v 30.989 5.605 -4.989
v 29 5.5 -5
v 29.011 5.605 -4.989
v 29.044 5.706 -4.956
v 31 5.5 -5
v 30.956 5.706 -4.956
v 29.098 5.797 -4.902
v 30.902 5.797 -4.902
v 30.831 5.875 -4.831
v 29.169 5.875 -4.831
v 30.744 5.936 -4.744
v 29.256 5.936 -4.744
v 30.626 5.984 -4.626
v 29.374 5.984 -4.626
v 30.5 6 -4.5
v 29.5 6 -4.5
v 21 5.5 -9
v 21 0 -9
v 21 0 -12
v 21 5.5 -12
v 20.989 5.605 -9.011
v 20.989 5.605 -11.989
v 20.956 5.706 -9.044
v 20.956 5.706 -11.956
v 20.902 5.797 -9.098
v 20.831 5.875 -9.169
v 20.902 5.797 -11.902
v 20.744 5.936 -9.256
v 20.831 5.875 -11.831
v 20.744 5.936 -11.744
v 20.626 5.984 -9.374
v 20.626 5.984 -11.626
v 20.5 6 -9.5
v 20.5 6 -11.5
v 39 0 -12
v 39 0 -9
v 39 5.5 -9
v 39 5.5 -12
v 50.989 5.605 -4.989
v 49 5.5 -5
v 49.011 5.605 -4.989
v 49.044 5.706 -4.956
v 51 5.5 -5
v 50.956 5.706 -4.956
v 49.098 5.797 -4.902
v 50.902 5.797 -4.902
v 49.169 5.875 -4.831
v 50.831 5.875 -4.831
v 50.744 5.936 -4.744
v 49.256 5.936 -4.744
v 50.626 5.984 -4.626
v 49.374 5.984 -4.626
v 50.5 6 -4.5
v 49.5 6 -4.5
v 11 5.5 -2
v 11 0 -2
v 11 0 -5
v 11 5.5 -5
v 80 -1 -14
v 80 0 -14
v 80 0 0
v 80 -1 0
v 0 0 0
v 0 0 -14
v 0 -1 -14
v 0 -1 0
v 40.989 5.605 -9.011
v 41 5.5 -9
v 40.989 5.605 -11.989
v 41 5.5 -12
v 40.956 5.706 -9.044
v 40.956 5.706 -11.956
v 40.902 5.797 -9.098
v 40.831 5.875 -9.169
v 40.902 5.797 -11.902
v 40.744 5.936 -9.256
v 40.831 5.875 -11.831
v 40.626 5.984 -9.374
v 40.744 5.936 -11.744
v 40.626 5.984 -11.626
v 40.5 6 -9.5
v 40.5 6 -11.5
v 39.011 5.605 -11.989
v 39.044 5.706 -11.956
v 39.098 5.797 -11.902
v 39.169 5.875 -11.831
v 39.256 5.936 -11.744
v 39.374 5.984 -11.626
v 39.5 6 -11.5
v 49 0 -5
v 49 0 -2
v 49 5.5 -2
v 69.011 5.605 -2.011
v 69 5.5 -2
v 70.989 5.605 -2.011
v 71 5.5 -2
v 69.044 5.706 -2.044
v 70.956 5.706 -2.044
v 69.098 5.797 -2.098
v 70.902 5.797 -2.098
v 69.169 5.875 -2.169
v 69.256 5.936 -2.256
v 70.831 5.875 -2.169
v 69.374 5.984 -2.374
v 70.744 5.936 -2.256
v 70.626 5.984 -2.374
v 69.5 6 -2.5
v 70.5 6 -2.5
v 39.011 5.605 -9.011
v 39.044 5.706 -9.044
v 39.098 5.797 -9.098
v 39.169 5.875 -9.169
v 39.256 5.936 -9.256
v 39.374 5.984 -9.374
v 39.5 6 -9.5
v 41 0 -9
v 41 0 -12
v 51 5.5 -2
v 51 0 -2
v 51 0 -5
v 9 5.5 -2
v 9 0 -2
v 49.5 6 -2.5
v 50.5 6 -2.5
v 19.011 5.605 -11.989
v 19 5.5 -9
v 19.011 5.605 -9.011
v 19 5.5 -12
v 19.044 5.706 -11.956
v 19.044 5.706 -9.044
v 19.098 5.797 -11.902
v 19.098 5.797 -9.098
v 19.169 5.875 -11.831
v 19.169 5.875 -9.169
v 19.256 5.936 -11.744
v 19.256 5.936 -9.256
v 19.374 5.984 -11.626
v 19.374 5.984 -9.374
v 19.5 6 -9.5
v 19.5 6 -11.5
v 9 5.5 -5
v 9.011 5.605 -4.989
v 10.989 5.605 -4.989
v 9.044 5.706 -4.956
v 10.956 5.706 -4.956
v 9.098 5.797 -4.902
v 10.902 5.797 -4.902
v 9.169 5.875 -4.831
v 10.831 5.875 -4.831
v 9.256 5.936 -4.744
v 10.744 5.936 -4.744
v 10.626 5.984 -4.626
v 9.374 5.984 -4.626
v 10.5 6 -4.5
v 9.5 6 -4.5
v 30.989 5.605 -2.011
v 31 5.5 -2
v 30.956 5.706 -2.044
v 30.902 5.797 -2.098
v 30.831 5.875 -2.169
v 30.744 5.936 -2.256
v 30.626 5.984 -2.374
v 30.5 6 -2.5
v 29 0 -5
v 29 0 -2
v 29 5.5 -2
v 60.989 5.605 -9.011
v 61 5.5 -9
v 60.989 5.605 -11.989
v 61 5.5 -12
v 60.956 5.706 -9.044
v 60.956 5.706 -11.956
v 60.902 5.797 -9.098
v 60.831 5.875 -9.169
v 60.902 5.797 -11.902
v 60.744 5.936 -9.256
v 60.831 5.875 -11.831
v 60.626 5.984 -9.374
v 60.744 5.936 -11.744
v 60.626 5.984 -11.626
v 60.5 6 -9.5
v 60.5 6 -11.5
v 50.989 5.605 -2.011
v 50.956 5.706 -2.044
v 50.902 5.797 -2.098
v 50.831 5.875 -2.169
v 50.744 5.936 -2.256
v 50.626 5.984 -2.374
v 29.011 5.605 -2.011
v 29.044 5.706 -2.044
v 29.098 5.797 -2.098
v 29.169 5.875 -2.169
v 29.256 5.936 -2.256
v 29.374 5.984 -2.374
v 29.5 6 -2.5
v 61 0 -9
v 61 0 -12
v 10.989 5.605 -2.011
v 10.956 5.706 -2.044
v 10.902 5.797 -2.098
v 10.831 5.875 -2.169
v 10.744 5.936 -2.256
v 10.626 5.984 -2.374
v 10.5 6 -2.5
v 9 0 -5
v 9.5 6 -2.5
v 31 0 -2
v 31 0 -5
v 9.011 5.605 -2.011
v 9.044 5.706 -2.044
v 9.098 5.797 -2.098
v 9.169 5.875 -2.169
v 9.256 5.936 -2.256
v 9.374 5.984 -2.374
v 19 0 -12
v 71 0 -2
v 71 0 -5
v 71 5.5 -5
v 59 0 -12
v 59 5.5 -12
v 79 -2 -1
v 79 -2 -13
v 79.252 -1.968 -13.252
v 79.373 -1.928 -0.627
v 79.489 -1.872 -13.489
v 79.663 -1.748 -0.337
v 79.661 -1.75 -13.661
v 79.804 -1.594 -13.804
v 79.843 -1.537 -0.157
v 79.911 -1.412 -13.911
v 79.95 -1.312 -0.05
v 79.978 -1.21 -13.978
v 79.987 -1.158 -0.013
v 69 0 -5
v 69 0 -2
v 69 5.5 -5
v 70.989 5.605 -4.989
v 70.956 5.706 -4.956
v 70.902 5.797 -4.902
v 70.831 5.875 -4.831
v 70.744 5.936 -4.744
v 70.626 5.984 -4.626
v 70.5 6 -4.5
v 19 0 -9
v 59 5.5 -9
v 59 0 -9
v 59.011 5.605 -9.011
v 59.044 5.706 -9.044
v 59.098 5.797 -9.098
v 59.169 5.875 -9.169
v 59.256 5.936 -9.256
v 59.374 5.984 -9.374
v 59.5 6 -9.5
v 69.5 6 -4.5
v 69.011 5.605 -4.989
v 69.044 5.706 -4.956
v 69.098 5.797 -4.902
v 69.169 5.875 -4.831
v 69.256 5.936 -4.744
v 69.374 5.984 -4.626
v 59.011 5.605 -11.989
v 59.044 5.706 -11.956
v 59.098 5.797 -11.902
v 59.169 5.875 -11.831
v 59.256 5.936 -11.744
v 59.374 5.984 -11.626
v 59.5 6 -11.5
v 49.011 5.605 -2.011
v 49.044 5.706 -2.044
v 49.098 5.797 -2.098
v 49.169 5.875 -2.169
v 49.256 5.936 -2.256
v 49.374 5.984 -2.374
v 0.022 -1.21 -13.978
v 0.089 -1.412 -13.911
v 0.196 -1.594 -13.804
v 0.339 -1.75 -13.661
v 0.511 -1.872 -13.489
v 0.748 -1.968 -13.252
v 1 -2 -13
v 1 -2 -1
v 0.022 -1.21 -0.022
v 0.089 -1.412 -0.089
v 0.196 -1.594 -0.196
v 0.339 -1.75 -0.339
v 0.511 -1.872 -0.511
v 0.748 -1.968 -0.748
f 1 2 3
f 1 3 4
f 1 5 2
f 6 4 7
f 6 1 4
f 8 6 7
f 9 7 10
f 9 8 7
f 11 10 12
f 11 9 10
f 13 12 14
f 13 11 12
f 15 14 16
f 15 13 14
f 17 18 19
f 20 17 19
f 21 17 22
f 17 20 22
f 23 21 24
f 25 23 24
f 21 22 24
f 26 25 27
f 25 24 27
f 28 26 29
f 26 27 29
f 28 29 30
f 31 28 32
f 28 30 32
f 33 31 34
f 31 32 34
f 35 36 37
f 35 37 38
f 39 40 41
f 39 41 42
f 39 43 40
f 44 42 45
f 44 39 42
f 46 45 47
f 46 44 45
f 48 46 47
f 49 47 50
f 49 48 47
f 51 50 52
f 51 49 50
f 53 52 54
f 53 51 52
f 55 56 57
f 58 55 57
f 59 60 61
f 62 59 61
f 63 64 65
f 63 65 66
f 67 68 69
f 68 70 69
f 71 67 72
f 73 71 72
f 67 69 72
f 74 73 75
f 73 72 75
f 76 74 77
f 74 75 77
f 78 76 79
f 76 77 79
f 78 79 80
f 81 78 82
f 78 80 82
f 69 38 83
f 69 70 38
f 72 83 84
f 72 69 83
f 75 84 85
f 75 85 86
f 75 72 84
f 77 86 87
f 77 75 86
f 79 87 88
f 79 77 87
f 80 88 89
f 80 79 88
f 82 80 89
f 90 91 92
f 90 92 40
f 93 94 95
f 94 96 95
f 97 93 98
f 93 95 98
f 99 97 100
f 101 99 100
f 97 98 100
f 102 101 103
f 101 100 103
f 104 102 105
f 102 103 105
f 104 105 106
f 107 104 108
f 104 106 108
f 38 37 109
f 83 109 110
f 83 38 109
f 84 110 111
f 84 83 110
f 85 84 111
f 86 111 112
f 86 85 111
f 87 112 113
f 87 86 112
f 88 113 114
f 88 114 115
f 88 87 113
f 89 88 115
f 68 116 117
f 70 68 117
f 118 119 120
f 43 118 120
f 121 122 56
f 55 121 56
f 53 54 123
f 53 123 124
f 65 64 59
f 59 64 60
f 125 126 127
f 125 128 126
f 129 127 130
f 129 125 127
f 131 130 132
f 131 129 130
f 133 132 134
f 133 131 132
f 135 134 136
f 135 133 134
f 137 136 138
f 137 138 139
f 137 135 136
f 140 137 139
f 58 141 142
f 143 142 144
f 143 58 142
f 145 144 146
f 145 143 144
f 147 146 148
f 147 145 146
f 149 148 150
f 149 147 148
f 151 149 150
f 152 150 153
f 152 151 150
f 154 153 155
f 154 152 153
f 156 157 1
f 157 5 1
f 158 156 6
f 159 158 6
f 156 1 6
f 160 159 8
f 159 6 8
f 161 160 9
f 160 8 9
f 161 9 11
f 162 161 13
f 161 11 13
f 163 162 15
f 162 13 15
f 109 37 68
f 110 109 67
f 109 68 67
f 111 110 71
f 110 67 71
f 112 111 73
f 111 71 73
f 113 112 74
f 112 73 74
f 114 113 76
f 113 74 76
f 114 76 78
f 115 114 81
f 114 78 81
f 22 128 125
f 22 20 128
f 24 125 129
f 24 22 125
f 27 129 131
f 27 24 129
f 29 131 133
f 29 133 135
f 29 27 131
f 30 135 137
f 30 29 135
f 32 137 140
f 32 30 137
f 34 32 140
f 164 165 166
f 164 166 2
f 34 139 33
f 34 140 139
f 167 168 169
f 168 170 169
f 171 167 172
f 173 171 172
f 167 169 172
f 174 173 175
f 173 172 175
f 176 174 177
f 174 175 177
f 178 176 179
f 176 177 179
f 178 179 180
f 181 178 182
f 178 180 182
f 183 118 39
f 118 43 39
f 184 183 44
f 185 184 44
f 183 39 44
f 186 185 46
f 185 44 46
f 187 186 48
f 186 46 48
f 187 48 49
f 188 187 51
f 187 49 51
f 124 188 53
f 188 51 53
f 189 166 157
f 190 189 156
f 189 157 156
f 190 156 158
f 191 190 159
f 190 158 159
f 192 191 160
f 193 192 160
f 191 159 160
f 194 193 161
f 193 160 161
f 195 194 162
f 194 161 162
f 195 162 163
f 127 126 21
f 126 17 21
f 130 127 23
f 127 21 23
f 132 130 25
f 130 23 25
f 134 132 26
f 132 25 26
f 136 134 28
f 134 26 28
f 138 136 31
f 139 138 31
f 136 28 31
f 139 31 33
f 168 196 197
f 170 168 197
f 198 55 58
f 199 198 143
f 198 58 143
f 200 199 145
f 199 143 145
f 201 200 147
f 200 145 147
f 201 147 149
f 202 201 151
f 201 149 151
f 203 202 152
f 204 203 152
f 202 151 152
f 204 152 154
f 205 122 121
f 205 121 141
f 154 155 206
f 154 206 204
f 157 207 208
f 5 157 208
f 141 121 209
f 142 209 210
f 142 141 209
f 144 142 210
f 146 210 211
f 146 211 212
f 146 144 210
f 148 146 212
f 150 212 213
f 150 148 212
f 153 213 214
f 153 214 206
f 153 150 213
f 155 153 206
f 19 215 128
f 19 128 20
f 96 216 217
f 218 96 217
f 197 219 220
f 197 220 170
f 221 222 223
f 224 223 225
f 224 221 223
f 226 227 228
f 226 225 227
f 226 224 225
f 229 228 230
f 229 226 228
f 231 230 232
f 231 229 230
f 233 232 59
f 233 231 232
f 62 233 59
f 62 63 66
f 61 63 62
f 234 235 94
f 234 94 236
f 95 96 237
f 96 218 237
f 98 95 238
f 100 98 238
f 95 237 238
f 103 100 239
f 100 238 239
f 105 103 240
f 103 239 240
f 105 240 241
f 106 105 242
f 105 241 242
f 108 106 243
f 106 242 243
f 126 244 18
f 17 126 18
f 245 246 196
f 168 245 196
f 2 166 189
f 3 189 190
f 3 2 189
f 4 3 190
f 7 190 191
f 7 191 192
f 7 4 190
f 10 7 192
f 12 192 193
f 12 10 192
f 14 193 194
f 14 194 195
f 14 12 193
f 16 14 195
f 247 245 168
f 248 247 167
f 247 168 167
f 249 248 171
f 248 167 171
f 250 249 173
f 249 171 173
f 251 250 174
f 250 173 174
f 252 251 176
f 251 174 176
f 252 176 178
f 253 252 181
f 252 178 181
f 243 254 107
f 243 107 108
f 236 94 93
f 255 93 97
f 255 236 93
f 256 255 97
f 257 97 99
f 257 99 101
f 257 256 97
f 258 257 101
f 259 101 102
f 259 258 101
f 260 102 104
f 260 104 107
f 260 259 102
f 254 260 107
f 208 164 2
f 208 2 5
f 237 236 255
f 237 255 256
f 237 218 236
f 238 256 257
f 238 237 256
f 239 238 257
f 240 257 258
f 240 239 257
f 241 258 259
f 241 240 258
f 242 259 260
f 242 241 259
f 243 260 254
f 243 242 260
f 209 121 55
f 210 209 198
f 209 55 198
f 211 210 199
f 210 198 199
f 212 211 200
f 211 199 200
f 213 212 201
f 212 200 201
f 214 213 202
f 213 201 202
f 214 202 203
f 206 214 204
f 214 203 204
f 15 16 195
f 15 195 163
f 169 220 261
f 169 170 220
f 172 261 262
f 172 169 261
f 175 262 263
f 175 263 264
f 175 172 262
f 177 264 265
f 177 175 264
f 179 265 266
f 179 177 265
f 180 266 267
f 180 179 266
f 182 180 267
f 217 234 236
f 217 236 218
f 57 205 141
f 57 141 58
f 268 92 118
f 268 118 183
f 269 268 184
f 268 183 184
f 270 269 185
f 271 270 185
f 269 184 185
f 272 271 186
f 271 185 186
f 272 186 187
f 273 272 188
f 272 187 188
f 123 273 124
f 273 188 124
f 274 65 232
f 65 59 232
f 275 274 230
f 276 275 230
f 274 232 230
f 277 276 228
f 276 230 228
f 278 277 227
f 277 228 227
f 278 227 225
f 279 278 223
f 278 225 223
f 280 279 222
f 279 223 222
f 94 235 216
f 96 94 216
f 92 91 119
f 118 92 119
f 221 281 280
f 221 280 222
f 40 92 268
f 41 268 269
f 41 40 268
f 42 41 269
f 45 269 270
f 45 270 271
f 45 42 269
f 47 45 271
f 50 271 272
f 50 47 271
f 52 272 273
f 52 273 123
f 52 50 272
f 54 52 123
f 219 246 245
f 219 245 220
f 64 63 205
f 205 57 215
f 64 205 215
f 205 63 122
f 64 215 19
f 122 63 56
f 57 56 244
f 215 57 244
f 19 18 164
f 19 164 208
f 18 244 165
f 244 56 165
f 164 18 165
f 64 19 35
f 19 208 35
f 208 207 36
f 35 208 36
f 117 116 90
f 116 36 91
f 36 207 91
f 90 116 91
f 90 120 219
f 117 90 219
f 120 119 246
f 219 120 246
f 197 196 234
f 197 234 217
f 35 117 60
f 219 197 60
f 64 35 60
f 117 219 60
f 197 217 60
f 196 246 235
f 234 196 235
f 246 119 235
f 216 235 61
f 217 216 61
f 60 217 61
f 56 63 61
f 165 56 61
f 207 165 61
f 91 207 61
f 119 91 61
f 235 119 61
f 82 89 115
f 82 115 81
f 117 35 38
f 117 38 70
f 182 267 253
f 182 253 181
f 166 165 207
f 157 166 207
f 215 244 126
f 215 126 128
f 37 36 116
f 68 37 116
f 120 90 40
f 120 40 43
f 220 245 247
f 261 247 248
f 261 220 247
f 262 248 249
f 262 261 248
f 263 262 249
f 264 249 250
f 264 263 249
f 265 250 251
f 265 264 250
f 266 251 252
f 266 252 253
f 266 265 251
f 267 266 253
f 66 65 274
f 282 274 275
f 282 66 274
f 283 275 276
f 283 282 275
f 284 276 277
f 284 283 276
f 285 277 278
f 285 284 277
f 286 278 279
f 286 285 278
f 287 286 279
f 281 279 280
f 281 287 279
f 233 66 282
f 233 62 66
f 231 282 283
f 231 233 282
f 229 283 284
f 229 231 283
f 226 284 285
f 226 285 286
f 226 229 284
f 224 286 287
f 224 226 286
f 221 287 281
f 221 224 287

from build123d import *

# Parameters (mm, degrees)
SKETCH1_W             = 2
SKETCH1_H             = 3
BOSS_EXTRUDE1_DEPTH   = 6
BOSS_EXTRUDE1_2_DEPTH = 6
BOSS_EXTRUDE1_3_DEPTH = 6
BOSS_EXTRUDE1_4_DEPTH = 6
BOSS_EXTRUDE1_5_DEPTH = 6
BOSS_EXTRUDE1_6_DEPTH = 6
BOSS_EXTRUDE1_7_DEPTH = 6
SKETCH2_W             = 80
SKETCH2_H             = 14
BOSS_EXTRUDE2_DEPTH   = 2
FILLET1_R             = 1
FILLET2_R             = 0.5


with BuildPart() as part:
    # Sketch1 → Boss-Extrude1 (new body)
    with BuildSketch(Plane(origin=(0, 0, 0), x_dir=(1, 0, 0), z_dir=(0, 1, 0))):
        with Locations((20, 10.5)):
            Rectangle(SKETCH1_W, SKETCH1_H)
    extrude(amount=BOSS_EXTRUDE1_DEPTH)



with BuildPart() as body_2:
    # Sketch1 → Boss-Extrude1 2 (new body)
    with BuildSketch(Plane(origin=(0, 0, 0), x_dir=(1, 0, 0), z_dir=(0, 1, 0))):
        with Locations((30, 3.5)):
            Rectangle(SKETCH1_W, SKETCH1_H)
    extrude(amount=BOSS_EXTRUDE1_2_DEPTH)


with BuildPart() as body_3:
    # Sketch1 → Boss-Extrude1 3 (new body)
    with BuildSketch(Plane(origin=(0, 0, 0), x_dir=(1, 0, 0), z_dir=(0, 1, 0))):
        with Locations((40, 10.5)):
            Rectangle(SKETCH1_W, SKETCH1_H)
    extrude(amount=BOSS_EXTRUDE1_3_DEPTH)


with BuildPart() as body_4:
    # Sketch1 → Boss-Extrude1 4 (new body)
    with BuildSketch(Plane(origin=(0, 0, 0), x_dir=(1, 0, 0), z_dir=(0, 1, 0))):
        with Locations((50, 3.5)):
            Rectangle(SKETCH1_W, SKETCH1_H)
    extrude(amount=BOSS_EXTRUDE1_4_DEPTH)


with BuildPart() as body_5:
    # Sketch1 → Boss-Extrude1 5 (new body)
    with BuildSketch(Plane(origin=(0, 0, 0), x_dir=(1, 0, 0), z_dir=(0, 1, 0))):
        with Locations((60, 10.5)):
            Rectangle(SKETCH1_W, SKETCH1_H)
    extrude(amount=BOSS_EXTRUDE1_5_DEPTH)


with BuildPart() as body_6:
    # Sketch1 → Boss-Extrude1 6 (new body)
    with BuildSketch(Plane(origin=(0, 0, 0), x_dir=(1, 0, 0), z_dir=(0, 1, 0))):
        with Locations((70, 3.5)):
            Rectangle(SKETCH1_W, SKETCH1_H)
    extrude(amount=BOSS_EXTRUDE1_6_DEPTH)


with BuildPart() as body_7:
    # Sketch1 → Boss-Extrude1 7 (new body)
    with BuildSketch(Plane(origin=(0, 0, 0), x_dir=(1, 0, 0), z_dir=(0, 1, 0))):
        with Locations((10, 3.5)):
            Rectangle(SKETCH1_W, SKETCH1_H)
    extrude(amount=BOSS_EXTRUDE1_7_DEPTH)


with BuildPart() as part_1:
    add(part.part)

    add(body_2.part)  # Boss-Extrude2 merges body 2

    add(body_3.part)  # Boss-Extrude2 merges body 3

    add(body_4.part)  # Boss-Extrude2 merges body 4

    add(body_5.part)  # Boss-Extrude2 merges body 5

    add(body_6.part)  # Boss-Extrude2 merges body 6

    add(body_7.part)  # Boss-Extrude2 merges body 7
    # Sketch2 → Boss-Extrude2 (add)
    with BuildSketch(Plane.XZ):
        with Locations((40, -7)):
            Rectangle(SKETCH2_W, SKETCH2_H)
    extrude(amount=BOSS_EXTRUDE2_DEPTH)

    # Fillet1
    fillet1_edges = [part_1.edges().sort_by_distance(p)[0] for p in [
        (0, -2, -7),
        (40, -2, -14),
        (80, -2, -7),
        (40, -2, 0),
    ]]
    fillet(fillet1_edges, radius=FILLET1_R)

    # Fillet2
    fillet2_edges = [part_1.edges().sort_by_distance(p)[0] for p in [
        (20, 6, -9),
        (51, 6, -3.5),
        (50, 6, -5),
        (49, 6, -3.5),
        (50, 6, -2),
        (61, 6, -10.5),
        (60, 6, -12),
        (59, 6, -10.5),
        (60, 6, -9),
        (71, 6, -3.5),
        (70, 6, -5),
        (69, 6, -3.5),
        (70, 6, -2),
        (10, 6, -5),
        (11, 6, -3.5),
        (9, 6, -3.5),
        (10, 6, -2),
        (21, 6, -10.5),
        (20, 6, -12),
        (19, 6, -10.5),
        (31, 6, -3.5),
        (30, 6, -5),
        (29, 6, -3.5),
        (30, 6, -2),
        (41, 6, -10.5),
        (40, 6, -12),
        (39, 6, -10.5),
        (40, 6, -9),
    ]]
    fillet(fillet2_edges, radius=FILLET2_R)


solid = part_1.part
